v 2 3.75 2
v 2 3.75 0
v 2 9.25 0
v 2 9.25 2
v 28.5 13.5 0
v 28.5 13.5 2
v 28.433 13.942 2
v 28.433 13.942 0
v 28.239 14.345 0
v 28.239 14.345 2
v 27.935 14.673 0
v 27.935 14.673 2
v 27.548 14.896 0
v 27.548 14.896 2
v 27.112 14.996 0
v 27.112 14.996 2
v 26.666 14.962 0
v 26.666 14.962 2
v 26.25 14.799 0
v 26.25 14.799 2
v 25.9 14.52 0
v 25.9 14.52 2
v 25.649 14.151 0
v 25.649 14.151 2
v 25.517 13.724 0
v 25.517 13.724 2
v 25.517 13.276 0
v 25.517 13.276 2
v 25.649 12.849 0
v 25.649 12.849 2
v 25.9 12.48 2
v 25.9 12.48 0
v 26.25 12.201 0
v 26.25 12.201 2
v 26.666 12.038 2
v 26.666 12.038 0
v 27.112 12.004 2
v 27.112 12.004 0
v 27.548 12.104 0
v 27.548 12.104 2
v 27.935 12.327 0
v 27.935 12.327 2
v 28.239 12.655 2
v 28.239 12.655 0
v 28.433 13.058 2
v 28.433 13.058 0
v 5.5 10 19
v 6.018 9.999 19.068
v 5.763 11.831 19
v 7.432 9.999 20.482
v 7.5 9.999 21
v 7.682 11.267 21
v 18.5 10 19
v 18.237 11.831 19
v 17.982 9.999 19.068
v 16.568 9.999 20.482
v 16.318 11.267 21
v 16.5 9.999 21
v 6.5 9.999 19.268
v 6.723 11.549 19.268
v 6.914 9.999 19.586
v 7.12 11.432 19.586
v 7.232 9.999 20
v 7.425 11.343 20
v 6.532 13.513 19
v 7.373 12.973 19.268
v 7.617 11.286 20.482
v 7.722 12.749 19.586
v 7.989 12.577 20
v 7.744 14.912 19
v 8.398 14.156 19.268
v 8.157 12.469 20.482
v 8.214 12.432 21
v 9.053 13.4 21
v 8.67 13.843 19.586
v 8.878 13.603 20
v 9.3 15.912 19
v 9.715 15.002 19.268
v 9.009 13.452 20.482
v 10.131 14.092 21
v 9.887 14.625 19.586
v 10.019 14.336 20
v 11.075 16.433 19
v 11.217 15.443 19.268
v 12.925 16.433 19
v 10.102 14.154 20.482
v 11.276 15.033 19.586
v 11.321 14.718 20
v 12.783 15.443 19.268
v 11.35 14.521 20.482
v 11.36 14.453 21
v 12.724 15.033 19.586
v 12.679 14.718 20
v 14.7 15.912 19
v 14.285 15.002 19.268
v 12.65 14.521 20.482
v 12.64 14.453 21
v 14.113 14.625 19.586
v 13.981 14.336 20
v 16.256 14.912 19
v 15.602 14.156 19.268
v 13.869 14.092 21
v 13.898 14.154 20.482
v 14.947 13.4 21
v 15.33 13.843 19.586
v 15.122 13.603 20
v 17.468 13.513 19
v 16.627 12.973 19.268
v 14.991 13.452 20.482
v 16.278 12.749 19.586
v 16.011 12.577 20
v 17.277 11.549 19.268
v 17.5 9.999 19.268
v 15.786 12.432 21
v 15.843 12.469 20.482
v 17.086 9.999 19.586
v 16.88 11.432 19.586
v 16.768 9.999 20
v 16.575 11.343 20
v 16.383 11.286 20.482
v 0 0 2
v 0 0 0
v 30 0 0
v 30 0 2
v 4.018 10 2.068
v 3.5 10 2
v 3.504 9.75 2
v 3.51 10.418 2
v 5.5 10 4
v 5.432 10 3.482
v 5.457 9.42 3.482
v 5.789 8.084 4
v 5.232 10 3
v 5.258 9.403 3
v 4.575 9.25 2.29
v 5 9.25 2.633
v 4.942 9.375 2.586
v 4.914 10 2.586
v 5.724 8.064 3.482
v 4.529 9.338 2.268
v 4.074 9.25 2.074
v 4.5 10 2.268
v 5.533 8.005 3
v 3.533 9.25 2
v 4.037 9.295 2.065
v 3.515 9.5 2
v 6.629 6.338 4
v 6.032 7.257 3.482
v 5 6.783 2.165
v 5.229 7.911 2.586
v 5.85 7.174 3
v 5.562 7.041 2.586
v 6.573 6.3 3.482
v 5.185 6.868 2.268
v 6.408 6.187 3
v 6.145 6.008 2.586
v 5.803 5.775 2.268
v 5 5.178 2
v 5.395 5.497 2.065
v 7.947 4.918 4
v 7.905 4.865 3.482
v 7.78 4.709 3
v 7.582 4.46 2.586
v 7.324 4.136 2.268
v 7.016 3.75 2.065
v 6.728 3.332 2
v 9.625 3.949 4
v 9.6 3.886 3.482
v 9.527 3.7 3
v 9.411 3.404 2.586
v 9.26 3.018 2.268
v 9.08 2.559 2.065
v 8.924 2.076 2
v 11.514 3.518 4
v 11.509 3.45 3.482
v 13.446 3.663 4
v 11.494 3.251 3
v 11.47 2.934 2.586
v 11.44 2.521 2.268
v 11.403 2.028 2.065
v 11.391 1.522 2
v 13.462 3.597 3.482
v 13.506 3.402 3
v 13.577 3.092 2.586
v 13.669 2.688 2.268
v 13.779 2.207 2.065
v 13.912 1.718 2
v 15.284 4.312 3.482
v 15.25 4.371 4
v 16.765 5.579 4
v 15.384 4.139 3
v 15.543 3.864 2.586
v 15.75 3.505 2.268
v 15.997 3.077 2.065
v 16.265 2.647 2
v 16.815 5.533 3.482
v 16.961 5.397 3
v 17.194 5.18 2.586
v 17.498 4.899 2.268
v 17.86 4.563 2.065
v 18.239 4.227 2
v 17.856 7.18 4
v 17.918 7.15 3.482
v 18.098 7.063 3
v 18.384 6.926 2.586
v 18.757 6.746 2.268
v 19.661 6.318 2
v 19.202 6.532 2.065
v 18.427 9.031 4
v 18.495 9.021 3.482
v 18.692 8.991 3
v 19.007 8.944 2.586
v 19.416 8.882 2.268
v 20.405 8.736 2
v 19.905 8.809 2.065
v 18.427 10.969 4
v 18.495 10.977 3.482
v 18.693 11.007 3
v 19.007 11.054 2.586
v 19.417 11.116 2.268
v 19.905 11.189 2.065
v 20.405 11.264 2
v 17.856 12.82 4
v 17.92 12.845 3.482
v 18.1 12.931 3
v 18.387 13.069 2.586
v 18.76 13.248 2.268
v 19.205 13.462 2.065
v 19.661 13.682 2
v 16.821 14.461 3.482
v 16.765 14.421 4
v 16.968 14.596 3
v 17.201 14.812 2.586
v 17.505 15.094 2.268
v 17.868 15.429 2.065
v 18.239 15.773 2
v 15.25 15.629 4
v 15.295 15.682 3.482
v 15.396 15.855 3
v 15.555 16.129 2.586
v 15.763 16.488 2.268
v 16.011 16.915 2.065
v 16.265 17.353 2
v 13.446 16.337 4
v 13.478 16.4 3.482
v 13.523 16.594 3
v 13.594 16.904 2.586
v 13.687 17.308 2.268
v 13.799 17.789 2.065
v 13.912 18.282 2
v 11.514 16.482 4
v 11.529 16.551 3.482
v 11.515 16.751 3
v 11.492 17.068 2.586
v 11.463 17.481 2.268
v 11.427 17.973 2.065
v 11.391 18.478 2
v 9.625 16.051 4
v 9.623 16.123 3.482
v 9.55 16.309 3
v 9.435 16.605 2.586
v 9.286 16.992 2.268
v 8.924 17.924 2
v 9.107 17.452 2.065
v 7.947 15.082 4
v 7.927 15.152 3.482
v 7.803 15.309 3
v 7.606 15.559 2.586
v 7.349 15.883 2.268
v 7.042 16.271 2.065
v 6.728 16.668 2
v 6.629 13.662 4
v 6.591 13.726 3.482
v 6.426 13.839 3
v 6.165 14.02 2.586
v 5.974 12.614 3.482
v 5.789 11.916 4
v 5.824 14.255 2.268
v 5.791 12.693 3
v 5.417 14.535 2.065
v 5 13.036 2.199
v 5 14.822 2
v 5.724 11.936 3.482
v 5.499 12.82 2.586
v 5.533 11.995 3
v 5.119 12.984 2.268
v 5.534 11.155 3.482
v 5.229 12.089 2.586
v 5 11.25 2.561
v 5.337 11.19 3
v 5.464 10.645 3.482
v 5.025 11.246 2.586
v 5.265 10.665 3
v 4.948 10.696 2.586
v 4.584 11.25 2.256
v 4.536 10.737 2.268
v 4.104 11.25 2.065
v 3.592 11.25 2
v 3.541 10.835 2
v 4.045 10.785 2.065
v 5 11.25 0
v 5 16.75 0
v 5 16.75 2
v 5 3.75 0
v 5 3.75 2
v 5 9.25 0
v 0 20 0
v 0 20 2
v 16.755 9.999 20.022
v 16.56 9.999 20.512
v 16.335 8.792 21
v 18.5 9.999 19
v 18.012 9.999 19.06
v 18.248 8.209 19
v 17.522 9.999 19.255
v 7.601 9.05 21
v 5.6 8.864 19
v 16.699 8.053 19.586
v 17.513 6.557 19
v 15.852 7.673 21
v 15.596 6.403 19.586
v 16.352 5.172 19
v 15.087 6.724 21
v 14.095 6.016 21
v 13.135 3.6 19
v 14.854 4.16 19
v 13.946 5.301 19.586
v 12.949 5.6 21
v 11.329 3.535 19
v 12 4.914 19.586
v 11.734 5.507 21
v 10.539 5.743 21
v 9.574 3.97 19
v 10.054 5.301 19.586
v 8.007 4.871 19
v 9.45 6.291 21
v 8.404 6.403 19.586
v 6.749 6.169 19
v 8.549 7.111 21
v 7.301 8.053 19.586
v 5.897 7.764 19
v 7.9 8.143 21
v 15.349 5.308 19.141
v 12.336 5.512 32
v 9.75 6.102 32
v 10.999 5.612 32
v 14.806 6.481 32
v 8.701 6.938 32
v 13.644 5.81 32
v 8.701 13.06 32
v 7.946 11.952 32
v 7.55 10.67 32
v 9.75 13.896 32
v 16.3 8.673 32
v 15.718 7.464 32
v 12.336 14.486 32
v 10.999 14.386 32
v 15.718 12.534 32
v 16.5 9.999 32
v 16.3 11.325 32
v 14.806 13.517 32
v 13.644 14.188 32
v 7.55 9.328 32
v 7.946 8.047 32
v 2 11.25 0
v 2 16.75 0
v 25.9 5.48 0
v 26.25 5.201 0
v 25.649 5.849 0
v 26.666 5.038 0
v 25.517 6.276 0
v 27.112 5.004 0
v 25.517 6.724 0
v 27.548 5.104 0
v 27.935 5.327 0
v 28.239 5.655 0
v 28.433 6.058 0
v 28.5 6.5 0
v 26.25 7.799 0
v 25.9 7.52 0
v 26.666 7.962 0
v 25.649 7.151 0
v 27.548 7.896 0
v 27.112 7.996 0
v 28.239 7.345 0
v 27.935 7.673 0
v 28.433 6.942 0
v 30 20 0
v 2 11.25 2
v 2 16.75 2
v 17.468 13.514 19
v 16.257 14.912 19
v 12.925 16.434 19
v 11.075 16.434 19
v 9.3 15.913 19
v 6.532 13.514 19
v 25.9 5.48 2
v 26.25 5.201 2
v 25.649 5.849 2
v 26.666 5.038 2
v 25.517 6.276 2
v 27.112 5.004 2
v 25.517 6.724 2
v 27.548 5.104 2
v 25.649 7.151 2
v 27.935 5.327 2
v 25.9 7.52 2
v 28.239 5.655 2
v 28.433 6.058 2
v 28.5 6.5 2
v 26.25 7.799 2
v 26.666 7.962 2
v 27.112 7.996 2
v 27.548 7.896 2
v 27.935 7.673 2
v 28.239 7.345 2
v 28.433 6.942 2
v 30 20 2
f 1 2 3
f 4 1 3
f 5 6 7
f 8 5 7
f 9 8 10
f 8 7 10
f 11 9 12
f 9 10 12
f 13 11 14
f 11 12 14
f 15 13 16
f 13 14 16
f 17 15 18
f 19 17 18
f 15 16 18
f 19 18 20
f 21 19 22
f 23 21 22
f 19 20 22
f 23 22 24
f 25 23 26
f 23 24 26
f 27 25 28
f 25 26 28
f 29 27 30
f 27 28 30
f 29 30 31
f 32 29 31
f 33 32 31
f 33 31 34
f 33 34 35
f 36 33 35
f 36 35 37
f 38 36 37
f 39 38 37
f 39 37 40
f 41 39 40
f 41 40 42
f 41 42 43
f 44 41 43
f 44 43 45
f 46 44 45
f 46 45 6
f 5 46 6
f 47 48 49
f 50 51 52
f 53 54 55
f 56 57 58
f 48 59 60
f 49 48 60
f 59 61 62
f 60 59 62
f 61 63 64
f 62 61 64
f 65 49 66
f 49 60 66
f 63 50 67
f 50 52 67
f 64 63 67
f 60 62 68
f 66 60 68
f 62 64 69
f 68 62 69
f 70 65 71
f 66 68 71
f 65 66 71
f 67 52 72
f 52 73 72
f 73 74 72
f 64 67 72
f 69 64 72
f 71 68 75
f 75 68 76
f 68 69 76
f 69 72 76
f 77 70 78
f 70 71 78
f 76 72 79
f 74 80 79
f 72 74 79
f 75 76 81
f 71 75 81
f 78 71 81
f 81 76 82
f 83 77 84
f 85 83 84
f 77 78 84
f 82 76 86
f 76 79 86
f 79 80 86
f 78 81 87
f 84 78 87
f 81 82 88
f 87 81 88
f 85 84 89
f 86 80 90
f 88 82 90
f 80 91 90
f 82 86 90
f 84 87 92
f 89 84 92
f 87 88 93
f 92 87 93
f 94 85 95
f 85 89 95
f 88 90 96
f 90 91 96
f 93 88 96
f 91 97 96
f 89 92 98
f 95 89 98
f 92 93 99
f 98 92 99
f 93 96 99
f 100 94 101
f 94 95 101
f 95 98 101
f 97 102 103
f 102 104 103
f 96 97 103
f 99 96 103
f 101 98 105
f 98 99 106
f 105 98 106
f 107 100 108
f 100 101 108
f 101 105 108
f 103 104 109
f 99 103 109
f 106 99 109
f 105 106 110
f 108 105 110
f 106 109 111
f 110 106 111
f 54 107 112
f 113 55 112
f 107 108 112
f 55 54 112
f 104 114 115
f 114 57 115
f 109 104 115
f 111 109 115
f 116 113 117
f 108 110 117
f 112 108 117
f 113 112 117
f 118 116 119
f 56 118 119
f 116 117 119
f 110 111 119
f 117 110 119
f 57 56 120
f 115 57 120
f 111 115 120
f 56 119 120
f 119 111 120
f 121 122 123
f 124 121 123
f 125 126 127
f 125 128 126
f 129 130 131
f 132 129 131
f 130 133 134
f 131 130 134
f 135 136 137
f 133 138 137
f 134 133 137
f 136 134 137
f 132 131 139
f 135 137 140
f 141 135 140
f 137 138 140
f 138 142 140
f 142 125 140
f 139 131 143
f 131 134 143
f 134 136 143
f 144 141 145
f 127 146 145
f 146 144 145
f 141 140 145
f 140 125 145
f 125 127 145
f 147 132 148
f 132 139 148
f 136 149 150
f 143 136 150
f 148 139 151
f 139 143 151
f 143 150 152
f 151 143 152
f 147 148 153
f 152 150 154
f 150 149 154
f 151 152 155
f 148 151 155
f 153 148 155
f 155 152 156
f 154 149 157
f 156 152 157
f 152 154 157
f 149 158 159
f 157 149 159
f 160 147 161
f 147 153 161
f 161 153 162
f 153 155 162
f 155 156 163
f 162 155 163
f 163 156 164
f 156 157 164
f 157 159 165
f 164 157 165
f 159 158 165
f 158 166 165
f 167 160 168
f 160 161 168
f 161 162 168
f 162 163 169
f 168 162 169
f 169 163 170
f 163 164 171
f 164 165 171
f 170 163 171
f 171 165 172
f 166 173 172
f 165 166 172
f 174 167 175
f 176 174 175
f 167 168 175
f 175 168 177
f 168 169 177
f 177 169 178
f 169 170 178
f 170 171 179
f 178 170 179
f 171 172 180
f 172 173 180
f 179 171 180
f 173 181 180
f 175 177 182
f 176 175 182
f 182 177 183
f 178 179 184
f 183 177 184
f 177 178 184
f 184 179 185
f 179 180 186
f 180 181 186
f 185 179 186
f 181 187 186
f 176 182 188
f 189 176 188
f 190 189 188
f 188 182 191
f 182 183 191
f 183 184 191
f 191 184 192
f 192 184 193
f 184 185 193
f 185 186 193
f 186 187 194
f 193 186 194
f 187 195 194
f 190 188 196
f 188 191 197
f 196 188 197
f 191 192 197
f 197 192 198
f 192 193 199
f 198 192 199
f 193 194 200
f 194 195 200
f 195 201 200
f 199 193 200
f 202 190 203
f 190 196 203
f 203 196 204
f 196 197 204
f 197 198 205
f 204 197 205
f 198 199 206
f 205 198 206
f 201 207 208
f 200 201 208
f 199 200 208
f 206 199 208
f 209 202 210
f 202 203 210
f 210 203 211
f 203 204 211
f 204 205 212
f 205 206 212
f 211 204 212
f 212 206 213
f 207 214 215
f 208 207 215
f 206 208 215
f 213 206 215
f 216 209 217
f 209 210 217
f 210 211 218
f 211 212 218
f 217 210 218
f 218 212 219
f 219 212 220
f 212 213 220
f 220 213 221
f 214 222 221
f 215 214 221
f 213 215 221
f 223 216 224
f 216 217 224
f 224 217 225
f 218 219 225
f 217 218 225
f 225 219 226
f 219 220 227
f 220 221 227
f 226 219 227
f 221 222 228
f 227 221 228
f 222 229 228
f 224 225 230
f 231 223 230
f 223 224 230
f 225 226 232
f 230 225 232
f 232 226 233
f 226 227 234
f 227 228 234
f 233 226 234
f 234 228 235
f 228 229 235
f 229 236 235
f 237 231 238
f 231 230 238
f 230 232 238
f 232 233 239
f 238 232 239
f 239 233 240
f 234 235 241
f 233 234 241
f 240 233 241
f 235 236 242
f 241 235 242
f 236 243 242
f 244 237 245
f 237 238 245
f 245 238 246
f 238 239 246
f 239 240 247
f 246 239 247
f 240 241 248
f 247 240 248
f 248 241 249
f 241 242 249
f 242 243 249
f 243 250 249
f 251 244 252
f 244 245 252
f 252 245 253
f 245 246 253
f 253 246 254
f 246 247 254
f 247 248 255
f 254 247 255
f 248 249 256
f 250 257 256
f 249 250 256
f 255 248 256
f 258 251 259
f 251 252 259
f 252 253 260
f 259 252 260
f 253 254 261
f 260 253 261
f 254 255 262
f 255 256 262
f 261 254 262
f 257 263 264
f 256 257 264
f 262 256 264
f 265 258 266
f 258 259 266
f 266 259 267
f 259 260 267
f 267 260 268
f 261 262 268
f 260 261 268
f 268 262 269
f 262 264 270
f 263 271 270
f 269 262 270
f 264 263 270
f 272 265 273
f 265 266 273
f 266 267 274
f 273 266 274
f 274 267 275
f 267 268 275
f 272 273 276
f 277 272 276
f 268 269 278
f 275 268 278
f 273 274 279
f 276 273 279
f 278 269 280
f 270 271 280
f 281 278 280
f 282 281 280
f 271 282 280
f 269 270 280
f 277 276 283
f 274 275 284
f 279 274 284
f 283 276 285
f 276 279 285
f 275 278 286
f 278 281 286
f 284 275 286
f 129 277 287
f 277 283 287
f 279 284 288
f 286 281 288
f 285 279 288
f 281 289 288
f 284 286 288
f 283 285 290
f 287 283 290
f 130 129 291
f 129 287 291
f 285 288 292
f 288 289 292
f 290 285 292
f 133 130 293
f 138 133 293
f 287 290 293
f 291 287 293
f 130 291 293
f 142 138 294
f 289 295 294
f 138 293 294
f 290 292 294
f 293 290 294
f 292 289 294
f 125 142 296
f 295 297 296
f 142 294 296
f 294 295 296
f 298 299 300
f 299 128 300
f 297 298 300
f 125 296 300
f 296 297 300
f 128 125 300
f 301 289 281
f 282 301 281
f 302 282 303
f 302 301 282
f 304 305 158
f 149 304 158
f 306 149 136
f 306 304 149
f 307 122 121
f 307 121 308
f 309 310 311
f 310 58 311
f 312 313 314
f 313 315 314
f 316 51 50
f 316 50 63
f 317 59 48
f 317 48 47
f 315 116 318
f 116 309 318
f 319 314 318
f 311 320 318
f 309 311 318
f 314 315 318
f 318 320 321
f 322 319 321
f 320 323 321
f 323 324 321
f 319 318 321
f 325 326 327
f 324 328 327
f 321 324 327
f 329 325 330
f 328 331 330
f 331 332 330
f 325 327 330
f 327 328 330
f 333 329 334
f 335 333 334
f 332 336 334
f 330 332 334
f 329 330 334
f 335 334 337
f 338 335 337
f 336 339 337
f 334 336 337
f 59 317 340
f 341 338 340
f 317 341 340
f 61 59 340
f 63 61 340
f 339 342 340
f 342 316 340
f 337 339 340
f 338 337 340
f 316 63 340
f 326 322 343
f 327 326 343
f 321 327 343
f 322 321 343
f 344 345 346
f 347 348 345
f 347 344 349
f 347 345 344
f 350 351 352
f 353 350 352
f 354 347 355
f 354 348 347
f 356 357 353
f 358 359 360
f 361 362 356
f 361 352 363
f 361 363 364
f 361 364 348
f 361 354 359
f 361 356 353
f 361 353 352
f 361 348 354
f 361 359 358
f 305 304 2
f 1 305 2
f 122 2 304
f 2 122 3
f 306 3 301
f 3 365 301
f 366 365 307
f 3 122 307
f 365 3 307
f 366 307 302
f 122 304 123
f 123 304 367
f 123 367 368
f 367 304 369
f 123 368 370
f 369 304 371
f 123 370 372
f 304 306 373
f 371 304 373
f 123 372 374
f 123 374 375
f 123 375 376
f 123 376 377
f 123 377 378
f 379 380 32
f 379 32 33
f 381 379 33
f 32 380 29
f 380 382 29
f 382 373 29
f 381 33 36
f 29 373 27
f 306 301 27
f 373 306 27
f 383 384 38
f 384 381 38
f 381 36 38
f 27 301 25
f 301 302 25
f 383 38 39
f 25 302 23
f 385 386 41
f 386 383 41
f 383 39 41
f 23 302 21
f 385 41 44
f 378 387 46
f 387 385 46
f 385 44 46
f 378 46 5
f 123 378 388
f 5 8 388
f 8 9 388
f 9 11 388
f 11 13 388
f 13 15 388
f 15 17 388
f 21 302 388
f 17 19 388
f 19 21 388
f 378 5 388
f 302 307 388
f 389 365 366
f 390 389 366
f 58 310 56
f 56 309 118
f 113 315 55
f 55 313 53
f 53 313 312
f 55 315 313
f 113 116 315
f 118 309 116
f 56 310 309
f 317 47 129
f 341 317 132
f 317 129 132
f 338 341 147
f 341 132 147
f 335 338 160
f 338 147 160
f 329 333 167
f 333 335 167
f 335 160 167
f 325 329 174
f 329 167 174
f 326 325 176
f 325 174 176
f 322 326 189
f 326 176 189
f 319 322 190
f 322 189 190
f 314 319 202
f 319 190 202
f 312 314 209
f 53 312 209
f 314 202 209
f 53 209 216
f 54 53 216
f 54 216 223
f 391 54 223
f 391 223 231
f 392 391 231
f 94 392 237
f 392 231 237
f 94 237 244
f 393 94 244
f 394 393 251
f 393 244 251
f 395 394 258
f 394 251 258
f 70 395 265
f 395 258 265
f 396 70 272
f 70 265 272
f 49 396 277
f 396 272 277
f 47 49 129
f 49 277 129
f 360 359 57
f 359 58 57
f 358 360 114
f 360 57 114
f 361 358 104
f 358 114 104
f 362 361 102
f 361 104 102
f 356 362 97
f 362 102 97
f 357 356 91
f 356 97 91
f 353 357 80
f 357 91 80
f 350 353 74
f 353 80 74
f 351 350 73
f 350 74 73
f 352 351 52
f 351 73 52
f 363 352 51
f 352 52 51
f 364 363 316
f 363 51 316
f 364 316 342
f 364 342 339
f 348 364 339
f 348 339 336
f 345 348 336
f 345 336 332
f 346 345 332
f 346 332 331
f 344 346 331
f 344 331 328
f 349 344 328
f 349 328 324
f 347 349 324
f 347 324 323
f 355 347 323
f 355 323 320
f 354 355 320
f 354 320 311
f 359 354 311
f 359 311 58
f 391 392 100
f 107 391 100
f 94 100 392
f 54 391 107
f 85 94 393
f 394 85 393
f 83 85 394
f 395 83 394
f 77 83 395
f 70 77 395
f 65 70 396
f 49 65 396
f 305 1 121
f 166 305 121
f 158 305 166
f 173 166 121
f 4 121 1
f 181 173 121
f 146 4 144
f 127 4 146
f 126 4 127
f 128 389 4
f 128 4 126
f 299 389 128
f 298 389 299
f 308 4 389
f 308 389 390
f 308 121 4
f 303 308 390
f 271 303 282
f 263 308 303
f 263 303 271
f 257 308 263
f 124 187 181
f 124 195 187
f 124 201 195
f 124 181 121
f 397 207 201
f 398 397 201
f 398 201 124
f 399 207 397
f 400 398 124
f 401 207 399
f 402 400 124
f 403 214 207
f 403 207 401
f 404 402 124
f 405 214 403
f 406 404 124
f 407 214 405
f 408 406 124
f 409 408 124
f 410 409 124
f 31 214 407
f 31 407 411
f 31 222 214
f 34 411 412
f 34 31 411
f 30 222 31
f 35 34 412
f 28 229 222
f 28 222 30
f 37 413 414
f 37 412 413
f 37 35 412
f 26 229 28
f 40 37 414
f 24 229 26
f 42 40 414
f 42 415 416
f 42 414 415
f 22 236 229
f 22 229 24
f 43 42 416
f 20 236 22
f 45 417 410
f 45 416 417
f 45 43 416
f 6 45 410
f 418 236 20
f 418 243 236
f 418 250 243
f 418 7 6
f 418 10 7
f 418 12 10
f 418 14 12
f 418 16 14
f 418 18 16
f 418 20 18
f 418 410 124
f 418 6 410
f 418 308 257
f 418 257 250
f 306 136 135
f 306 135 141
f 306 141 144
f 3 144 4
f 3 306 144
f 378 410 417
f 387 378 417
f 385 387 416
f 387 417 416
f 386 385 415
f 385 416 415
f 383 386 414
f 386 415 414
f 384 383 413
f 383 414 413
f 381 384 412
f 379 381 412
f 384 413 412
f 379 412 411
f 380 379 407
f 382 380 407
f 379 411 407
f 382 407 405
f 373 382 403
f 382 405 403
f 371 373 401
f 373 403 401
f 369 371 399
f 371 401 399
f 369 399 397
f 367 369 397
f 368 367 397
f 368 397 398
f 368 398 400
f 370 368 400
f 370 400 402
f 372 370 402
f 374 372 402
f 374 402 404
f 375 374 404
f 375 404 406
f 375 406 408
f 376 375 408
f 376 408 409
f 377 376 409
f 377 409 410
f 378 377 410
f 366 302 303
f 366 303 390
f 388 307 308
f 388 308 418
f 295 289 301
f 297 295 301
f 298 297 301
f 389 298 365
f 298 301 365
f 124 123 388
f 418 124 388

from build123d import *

# Parameters (mm, degrees)
ESQUISSE1_W             = 30
ESQUISSE1_H             = 20
BOSS_EXTRU_1_DEPTH      = 2
ESQUISSE2_R             = 4.5
BOSS_EXTRU_2_DEPTH      = 30
ESQUISSE4_R             = 6.5
BOSS_EXTRU_3_DEPTH      = 17
CONG_1_R                = 2
ESQUISSE5_W             = 3
ESQUISSE5_H             = 5.5
ENL_V_MAT_EXTRU_1_DEPTH = 3
ESQUISSE6_R             = 1.5
ENL_V_MAT_EXTRU_2_DEPTH = 47.904157662


with BuildPart() as part:
    # Esquisse1 → Boss.-Extru.1 (new body)
    with BuildSketch(Plane.XY):
        with Locations((15, 10)):
            Rectangle(ESQUISSE1_W, ESQUISSE1_H)
    extrude(amount=BOSS_EXTRU_1_DEPTH)

    # Esquisse2 → Boss.-Extru.2 (add)
    with BuildSketch(Plane.XY.offset(2)):
        with Locations((12, 9.999053637)):
            Circle(ESQUISSE2_R)
    extrude(amount=BOSS_EXTRU_2_DEPTH)

    # Esquisse4 → Boss.-Extru.3 (add)
    with BuildSketch(Plane.XY.offset(2)):
        with Locations((12, 10)):
            Circle(ESQUISSE4_R)
    extrude(amount=BOSS_EXTRU_3_DEPTH)

    # Congé1
    cong_1_edges = [part.edges().sort_by_distance(p)[0] for p in [
        (7.5, 9.999053637, 19),
        (5.5, 10, 2),
    ]]
    fillet(cong_1_edges, radius=CONG_1_R)

    # Esquisse5 → Enlèv. mat.-Extru.1 (cut)
    with BuildSketch(Plane(origin=(0, 0, 0), x_dir=(-1, 0, 0), z_dir=(0, 0, -1))):
        with Locations((-3.5, 14)):
            Rectangle(ESQUISSE5_W, ESQUISSE5_H)
        with Locations((-3.5, 6.5)):
            Rectangle(ESQUISSE5_W, ESQUISSE5_H)
    extrude(amount=-ENL_V_MAT_EXTRU_1_DEPTH, mode=Mode.SUBTRACT)

    # Esquisse6 → Enlèv. mat.-Extru.2 (cut, through all)
    with BuildSketch(Plane.XY.offset(2)):
        with Locations((27, 13.5)):
            Circle(ESQUISSE6_R)
        with Locations((27, 6.5)):
            Circle(ESQUISSE6_R)
    extrude(amount=-ENL_V_MAT_EXTRU_2_DEPTH, mode=Mode.SUBTRACT)


solid = part.part
